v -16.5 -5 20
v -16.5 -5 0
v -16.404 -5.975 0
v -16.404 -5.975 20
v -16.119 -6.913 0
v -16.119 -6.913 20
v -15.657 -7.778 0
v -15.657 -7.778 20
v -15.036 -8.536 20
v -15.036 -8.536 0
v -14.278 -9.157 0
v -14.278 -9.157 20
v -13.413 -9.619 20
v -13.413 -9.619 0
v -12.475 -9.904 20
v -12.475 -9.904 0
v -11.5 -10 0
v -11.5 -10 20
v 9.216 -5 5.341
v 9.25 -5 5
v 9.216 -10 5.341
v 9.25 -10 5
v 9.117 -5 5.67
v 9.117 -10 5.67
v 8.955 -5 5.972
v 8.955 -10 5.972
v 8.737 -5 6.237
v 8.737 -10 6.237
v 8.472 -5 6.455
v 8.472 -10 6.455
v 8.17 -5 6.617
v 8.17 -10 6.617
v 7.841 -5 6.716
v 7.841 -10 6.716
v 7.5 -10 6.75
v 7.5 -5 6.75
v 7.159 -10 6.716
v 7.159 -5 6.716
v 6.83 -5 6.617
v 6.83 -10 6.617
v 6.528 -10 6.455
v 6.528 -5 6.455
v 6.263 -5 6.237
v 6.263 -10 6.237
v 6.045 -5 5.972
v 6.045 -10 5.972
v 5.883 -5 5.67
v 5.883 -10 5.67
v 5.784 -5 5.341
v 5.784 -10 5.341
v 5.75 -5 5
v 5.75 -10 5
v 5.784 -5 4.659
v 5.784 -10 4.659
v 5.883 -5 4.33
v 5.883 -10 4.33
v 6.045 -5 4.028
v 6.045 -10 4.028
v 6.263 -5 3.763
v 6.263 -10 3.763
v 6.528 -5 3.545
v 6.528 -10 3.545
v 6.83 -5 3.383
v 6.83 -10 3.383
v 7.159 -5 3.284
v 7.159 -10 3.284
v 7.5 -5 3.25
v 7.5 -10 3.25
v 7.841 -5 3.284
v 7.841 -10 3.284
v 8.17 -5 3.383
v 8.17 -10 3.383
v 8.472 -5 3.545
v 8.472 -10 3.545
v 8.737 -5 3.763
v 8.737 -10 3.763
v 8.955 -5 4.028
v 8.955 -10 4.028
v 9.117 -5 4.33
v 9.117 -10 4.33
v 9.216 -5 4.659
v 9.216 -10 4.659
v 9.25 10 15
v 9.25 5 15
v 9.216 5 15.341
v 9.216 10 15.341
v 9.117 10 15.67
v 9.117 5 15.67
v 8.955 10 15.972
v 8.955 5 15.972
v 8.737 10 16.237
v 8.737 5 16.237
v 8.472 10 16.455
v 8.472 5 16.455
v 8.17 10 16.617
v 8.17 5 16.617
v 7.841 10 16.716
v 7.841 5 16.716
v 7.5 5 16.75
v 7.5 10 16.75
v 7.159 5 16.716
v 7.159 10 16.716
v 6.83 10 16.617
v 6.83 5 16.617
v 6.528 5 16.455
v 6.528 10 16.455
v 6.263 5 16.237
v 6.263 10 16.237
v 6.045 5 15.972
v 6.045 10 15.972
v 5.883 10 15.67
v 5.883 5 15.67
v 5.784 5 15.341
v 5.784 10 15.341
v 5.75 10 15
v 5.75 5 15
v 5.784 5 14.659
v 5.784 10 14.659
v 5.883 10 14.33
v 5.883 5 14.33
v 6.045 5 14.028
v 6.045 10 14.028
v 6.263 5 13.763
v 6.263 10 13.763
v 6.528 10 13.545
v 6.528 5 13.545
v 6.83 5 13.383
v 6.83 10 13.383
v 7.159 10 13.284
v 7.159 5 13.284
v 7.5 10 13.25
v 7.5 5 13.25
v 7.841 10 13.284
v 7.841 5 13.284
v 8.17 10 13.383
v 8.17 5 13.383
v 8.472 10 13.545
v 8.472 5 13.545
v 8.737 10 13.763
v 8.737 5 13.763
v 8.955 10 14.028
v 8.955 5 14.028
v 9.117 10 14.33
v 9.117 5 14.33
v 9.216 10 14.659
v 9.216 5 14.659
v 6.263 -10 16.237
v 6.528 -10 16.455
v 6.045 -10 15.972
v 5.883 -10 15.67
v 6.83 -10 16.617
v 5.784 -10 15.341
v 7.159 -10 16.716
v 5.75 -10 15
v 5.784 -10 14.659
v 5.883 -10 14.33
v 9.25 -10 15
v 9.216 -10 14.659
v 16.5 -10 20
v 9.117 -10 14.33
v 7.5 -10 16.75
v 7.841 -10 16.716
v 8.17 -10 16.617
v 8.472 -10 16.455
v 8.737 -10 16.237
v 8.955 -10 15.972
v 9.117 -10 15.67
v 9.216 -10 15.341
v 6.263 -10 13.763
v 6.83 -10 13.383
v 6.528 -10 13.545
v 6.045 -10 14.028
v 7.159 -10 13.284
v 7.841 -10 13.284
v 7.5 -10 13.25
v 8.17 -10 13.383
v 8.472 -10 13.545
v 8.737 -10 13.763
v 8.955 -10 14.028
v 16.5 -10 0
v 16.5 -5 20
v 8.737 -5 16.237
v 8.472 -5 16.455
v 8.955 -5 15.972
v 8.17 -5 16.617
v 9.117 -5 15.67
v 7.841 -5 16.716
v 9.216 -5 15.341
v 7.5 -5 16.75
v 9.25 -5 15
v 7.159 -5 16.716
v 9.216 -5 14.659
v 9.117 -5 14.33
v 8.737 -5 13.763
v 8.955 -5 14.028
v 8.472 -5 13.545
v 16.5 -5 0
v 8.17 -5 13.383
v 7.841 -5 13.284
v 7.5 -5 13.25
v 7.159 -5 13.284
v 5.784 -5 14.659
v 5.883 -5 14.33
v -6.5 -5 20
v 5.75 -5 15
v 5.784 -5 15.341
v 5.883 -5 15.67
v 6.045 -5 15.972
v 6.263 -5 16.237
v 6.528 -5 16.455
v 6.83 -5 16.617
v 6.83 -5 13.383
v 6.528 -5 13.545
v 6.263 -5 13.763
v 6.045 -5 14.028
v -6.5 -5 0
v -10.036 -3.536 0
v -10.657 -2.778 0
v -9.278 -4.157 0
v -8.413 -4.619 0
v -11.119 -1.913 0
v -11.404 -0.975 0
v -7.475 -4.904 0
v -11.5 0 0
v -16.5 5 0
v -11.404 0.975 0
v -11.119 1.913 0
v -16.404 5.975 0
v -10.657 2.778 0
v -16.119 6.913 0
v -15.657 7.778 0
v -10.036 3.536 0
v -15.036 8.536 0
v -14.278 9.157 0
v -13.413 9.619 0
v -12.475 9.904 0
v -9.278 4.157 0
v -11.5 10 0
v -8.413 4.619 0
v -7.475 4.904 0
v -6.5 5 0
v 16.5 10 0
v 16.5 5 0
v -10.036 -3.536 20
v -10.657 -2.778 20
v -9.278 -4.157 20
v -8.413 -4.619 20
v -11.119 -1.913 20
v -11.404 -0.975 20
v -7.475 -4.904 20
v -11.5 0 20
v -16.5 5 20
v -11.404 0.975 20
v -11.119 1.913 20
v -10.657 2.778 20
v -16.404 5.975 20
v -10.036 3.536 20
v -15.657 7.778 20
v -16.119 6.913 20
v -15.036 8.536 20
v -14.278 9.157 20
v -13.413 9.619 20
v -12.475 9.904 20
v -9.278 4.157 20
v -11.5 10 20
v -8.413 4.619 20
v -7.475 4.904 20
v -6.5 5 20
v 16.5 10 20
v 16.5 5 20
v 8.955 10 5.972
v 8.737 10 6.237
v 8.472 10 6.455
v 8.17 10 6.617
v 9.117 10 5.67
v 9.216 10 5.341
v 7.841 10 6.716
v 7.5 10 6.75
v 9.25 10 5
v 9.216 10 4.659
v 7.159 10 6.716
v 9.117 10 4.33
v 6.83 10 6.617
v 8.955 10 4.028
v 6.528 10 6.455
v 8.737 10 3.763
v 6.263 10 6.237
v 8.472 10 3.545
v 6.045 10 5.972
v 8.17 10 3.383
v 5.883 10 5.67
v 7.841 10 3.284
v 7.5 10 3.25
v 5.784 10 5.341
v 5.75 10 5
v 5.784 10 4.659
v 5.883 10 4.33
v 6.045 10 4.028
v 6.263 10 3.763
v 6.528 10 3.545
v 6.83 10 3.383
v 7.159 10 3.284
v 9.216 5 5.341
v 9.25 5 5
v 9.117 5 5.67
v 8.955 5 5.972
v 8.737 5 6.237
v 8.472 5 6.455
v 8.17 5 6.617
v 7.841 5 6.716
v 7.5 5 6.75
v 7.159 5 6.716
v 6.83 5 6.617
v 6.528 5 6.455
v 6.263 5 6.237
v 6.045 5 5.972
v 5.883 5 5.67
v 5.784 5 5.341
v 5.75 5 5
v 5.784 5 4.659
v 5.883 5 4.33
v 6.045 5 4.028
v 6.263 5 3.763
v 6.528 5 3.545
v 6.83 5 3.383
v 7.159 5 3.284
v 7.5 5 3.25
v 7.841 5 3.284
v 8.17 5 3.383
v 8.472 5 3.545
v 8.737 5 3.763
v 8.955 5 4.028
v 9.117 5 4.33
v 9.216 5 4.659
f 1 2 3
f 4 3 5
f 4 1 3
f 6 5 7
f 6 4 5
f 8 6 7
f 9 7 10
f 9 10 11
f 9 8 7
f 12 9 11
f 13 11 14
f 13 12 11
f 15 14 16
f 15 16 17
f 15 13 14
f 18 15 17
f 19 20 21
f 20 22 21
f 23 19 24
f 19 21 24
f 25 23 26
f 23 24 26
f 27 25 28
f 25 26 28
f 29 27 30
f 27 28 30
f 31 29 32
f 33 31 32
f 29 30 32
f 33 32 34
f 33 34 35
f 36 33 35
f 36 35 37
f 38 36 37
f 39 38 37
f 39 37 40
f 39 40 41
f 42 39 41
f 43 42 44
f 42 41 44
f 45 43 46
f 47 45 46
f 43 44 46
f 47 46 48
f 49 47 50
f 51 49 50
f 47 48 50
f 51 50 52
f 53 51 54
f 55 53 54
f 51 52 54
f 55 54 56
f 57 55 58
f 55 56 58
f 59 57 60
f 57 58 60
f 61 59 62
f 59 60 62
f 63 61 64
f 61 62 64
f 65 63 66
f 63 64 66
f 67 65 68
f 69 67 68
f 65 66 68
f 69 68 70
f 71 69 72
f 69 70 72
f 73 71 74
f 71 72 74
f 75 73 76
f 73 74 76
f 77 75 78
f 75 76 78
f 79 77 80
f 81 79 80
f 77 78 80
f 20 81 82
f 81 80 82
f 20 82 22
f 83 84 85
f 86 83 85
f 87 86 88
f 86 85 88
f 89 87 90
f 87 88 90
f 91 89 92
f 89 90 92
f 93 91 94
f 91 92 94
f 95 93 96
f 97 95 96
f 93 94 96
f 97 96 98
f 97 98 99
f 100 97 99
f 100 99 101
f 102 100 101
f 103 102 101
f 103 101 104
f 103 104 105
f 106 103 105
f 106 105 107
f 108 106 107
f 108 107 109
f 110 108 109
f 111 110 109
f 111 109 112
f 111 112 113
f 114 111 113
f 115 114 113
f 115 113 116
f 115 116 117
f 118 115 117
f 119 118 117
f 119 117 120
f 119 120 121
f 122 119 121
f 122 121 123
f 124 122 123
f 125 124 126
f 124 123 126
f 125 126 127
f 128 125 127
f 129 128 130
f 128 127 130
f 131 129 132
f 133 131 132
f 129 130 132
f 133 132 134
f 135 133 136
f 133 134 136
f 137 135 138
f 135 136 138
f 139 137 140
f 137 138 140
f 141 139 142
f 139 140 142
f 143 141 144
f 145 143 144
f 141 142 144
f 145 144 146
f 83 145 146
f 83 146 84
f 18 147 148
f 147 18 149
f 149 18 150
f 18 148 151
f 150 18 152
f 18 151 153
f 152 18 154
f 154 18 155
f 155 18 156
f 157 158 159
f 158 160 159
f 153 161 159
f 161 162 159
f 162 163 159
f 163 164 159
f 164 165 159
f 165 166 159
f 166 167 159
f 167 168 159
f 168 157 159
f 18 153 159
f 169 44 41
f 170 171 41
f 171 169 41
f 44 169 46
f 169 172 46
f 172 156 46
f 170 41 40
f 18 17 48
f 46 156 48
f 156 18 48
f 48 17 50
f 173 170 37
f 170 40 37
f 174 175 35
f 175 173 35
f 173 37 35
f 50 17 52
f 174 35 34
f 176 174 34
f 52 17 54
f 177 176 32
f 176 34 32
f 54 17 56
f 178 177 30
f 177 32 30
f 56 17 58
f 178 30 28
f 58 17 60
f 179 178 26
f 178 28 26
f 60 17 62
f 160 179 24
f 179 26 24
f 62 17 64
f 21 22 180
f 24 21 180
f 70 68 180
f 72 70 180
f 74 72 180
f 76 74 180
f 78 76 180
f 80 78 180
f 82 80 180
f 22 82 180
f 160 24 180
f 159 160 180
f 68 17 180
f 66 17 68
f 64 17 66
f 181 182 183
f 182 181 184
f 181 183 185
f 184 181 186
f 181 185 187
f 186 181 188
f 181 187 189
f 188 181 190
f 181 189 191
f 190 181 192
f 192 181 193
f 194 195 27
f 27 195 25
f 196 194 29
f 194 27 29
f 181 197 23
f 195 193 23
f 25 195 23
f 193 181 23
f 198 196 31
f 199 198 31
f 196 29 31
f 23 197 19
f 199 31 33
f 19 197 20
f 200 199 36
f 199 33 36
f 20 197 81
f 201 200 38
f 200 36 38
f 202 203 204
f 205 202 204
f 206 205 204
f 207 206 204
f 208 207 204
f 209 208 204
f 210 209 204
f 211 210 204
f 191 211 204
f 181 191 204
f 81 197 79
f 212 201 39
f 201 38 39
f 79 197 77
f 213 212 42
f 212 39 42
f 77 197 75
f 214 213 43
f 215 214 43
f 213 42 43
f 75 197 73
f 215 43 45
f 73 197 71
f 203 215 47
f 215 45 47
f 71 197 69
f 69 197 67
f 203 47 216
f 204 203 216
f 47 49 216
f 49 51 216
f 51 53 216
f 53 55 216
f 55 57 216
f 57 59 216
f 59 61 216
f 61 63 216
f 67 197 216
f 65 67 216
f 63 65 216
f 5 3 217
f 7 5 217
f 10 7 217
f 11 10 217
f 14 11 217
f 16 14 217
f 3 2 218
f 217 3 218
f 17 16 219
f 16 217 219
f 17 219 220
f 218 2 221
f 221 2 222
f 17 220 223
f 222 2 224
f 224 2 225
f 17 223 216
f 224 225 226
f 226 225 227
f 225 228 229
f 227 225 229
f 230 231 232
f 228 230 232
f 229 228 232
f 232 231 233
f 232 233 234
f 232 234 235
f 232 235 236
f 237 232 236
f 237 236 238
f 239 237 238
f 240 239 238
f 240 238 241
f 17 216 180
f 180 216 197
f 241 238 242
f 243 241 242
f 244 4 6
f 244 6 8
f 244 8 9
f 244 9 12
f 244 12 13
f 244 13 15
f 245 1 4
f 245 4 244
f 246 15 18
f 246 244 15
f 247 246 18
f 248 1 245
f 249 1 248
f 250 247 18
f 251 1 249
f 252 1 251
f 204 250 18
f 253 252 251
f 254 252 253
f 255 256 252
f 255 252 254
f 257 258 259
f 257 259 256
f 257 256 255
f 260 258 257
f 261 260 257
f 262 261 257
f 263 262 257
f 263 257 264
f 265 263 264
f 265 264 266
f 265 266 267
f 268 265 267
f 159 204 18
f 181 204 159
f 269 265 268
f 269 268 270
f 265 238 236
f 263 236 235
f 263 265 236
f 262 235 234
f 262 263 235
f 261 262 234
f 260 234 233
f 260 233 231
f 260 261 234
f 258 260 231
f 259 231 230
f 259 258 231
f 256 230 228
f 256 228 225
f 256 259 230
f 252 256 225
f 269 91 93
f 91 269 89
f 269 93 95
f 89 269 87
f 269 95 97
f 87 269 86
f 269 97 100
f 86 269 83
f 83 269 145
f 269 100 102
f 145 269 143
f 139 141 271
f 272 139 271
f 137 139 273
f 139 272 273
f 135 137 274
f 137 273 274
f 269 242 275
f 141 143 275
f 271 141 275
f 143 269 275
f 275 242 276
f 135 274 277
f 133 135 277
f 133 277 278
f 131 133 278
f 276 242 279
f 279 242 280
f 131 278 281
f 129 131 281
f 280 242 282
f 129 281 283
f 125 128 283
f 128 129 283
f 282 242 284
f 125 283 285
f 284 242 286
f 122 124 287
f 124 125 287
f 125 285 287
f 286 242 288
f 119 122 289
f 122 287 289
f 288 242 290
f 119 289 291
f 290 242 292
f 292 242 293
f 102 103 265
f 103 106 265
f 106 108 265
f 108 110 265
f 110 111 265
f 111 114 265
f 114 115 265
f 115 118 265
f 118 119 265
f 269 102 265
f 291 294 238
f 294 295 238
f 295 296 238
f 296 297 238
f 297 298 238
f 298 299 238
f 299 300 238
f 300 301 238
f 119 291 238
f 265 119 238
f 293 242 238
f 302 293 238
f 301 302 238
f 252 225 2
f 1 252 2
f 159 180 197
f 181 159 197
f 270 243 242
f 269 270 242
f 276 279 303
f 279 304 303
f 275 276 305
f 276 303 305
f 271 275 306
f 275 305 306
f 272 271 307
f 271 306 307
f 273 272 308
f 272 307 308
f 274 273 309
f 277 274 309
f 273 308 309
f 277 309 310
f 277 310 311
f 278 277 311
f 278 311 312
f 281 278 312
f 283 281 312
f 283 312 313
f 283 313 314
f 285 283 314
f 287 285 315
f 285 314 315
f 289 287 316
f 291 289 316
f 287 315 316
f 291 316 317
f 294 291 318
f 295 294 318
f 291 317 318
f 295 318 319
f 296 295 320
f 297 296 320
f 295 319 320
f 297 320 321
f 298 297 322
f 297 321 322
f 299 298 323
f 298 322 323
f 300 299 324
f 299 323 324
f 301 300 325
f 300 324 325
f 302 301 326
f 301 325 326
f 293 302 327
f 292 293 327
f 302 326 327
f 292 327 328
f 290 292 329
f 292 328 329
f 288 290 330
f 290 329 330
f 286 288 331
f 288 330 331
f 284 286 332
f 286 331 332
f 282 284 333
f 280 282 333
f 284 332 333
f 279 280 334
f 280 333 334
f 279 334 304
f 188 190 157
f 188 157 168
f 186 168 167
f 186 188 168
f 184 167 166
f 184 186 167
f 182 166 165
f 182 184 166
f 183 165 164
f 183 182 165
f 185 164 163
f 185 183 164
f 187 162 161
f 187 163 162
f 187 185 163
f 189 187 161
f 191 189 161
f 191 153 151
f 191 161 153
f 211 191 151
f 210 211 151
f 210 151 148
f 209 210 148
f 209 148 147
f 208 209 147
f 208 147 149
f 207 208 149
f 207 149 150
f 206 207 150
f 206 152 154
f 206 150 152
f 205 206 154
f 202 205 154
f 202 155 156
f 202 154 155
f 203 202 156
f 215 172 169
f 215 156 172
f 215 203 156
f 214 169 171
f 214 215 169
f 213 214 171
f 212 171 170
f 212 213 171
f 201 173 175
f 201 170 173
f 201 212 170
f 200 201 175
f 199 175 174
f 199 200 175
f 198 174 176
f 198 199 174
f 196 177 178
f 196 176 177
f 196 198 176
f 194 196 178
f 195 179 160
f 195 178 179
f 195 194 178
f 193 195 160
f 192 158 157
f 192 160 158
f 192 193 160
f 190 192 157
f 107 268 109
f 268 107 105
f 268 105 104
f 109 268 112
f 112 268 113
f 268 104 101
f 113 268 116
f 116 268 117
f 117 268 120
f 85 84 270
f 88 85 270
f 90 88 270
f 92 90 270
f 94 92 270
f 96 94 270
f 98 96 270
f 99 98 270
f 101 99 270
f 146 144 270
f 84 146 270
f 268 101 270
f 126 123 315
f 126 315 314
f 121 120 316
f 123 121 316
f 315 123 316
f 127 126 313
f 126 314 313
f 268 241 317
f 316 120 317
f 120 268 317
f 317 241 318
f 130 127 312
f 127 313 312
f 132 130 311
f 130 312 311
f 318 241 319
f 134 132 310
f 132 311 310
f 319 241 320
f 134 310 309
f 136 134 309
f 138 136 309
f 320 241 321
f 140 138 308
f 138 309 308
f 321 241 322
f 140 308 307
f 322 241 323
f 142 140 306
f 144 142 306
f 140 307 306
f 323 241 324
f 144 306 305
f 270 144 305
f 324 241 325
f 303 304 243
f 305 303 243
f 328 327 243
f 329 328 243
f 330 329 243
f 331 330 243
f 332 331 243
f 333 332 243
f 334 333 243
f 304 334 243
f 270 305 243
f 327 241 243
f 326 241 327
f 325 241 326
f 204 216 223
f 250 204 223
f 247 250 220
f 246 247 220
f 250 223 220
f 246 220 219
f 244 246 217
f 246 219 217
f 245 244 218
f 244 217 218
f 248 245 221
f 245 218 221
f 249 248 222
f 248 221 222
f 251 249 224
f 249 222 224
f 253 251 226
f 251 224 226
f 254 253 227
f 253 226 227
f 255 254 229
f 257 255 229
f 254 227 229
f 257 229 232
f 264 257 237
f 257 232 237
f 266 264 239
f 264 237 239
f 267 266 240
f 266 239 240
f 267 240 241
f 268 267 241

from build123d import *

# Parameters (mm, degrees)
F1_DEPTH = 20
F2_R     = 1.75
F3_DEPTH = 12.5
F4_R     = 5


with BuildPart() as f1:
    # F0 (on Top) → F1 (new body)
    with BuildSketch(Plane.XY):
        with BuildLine():
            Line((16.5, 10), (-16.5, 10))
            Line((-16.5, 10), (-16.5, -10))
            Line((-16.5, -10), (16.5, -10))
            Line((16.5, -10), (16.5, -5))
            Line((16.5, -5), (-6.5, -5))
            ThreePointArc((-6.5, -5), (-11.5, 0), (-6.5, 5))
            Line((-6.5, 5), (16.5, 5))
            Line((16.5, 5), (16.5, 10))
        make_face()
    extrude(amount=F1_DEPTH)

    # F2 (on Front) → F3 (cut, symmetric)
    with BuildSketch(Plane.XZ):
        with Locations((7.5, 15)):
            Circle(F2_R)
        with Locations((7.5, 5)):
            Circle(F2_R)
    extrude(amount=F3_DEPTH, both=True, mode=Mode.SUBTRACT)

    # F4
    f4_edges = [f1.edges().sort_by_distance(p)[0] for p in [
        (-16.5, 10, 10),
        (-16.5, -10, 10),
    ]]
    fillet(f4_edges, radius=F4_R)


solid = f1.part
